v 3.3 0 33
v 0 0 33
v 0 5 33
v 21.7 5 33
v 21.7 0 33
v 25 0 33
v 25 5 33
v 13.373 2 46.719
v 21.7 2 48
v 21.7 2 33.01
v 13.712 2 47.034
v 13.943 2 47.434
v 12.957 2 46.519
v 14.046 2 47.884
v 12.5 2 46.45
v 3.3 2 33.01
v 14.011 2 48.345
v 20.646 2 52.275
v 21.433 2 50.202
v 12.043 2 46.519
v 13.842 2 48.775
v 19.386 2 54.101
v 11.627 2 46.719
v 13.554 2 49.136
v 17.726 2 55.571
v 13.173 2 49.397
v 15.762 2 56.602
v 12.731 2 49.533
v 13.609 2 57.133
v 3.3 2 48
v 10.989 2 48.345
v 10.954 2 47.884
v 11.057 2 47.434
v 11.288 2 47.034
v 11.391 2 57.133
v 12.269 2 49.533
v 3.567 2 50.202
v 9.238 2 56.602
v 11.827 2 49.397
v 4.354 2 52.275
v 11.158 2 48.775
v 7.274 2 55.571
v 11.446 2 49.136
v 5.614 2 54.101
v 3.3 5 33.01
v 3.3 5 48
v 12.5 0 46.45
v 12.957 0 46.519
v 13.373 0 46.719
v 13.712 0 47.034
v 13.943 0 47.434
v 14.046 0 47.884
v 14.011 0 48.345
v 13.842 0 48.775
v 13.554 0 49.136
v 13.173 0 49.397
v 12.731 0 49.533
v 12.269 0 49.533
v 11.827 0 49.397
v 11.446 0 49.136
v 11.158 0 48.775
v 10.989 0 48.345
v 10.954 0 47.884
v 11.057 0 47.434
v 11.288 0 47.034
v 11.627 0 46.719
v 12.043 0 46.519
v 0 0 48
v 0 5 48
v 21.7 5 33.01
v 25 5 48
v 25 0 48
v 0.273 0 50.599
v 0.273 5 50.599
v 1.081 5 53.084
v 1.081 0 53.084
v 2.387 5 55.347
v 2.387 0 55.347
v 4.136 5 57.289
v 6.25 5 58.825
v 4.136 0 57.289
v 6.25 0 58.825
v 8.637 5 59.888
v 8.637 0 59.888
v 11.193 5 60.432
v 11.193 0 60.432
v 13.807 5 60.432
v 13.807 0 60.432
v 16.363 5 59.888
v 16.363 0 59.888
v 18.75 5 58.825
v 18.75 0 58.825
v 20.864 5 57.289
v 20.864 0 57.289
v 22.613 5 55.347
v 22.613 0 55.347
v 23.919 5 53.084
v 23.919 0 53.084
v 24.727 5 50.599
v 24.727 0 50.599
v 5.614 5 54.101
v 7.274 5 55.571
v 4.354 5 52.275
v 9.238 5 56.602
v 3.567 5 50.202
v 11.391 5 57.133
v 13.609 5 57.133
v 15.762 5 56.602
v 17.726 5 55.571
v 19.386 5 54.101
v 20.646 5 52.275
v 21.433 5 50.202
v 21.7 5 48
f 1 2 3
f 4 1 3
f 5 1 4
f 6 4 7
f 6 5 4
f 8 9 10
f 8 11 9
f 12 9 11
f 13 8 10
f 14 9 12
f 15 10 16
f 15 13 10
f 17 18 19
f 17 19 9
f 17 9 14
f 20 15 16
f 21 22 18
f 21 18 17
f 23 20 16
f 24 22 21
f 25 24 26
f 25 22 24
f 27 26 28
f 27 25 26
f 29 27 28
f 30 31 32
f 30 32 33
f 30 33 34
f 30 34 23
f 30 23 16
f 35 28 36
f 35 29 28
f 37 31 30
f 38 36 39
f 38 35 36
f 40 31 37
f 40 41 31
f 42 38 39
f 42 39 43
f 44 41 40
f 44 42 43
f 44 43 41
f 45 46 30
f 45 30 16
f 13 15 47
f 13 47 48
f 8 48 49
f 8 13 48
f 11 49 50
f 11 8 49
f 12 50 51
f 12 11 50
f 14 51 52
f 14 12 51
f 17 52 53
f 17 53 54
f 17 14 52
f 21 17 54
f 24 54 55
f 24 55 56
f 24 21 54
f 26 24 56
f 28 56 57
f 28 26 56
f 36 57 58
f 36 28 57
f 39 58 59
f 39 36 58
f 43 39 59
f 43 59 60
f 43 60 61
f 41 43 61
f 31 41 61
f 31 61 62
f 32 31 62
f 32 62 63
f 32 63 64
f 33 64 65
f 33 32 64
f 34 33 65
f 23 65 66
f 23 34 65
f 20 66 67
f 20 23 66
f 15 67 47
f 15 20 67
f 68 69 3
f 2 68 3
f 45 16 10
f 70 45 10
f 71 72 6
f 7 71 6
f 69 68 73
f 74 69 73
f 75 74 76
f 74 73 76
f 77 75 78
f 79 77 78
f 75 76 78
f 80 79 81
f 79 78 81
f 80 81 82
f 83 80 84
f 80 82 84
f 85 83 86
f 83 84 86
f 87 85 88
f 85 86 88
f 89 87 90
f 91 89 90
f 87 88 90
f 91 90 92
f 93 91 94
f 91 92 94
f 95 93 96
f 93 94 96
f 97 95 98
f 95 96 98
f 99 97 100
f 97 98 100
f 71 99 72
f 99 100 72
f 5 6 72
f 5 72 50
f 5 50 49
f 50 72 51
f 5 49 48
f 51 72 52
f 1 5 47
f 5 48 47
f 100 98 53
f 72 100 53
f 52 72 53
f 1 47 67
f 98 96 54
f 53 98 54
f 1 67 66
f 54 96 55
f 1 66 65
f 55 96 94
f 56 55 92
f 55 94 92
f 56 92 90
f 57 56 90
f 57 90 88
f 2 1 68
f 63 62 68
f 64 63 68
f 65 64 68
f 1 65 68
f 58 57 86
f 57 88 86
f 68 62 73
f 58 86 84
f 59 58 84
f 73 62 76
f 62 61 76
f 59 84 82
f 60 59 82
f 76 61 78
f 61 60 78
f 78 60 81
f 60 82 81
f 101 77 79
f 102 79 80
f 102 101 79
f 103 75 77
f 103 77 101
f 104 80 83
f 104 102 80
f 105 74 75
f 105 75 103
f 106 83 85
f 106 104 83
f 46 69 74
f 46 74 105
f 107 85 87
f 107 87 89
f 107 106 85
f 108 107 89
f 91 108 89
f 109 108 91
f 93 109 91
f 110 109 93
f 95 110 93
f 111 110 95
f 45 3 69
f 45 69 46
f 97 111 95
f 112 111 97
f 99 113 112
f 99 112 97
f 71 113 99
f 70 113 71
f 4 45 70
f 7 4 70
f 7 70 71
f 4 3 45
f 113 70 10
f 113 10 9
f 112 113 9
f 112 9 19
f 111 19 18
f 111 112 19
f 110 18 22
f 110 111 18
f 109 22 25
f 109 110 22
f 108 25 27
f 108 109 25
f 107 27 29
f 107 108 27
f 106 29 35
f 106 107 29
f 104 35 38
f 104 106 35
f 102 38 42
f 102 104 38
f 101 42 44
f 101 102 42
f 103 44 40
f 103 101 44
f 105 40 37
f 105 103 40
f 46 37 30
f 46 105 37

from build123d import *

# Parameters (mm, degrees)
SKETCH_1_R           = 2.55
SKETCH_1_R_2         = 7.5
EXTRUDE_1_DEPTH      = 5
FILLET_2_R           = 5
CUT_EXTRUDE_1_DEPTH  = 109.559891304
EXTRUDE_2_DEPTH      = 5
SKETCH_3_R           = 1.55
CUT_EXTRUDE_2_DEPTH  = 109.559891304
FILLET_3_R           = 2
SKETCH_5_R           = 3
CUT_EXTRUDE_3_DEPTH  = 3
SKETCH_6_OUTSIDE_W   = 117.274
SKETCH_6_OUTSIDE_H   = 115.837
SKETCH_6_OUTSIDE_W_2 = 25
SKETCH_6_OUTSIDE_H_2 = 29.920384019
CUT_EXTRUDE_4_DEPTH  = 109.559891304
EXTRUDE_START        = -2
SKETCH_7_R           = 1.55
EXTRUDE_3_DEPTH      = 2
SKETCH_8_W           = 18.4
SKETCH_8_H           = 0.01
EXTRUDE_4_DEPTH      = 3


with BuildPart() as part:
    # ｽｹｯﾁ1 → ﾎﾞｽ - 押し出し1 (new body)
    with BuildSketch(Plane(origin=(0, 0, 0), x_dir=(1, 0, 0), z_dir=(0, 1, 0))):
        with BuildLine():
            Line((0, 0), (0, -48))
            ThreePointArc((0, -48), (12.5, -60.5), (25, -48))
            Line((25, -48), (25, -20))
            Line((25, -20), (90, -20))
            Line((90, -20), (90, 30))
            Line((90, 30), (0, 0))
        make_face()
        with Locations(Location((75.769750529, 14.715657976, 0), (0, 0, 270))):
            Circle(SKETCH_1_R, mode=Mode.SUBTRACT)
        with Locations(Location((75, -10, 0), (0, 0, 270))):
            Circle(SKETCH_1_R, mode=Mode.SUBTRACT)
        with Locations(Location((25, -10, 0), (0, 0, 270))):
            Circle(SKETCH_1_R, mode=Mode.SUBTRACT)
        with Locations(Location((12.5, -48, 0), (0, 0, 270))):
            Circle(SKETCH_1_R_2, mode=Mode.SUBTRACT)
    extrude(amount=EXTRUDE_1_DEPTH)

    # ﾌｨﾚｯﾄ2
    fillet_2_edges = [part.edges().sort_by_distance(p)[0] for p in [
        (90, 2.5, -30),
        (90, 2.5, 20),
    ]]
    fillet(fillet_2_edges, radius=FILLET_2_R)

    # ｽｹｯﾁ2 → ｶｯﾄ - 押し出し1 (cut, through all)
    with BuildSketch(Plane(origin=(0, 5, 0), x_dir=(1, 0, 0), z_dir=(0, 1, 0))):
        with BuildLine():
            Line((3.3, -48), (3.3, -33))
            Line((3.3, -33), (21.7, -33))
            Line((21.7, -33), (21.7, -48))
            ThreePointArc((21.7, -48), (12.5, -57.2), (3.3, -48))
        make_face()
    extrude(amount=-CUT_EXTRUDE_1_DEPTH, mode=Mode.SUBTRACT)

    # ｽｹｯﾁ4 → ﾎﾞｽ - 押し出し2 (add)
    with BuildSketch(Plane(origin=(0, 5, 0), x_dir=(1, 0, 0), z_dir=(0, 1, 0))):
        Polygon((0, 0), (0, 20), (60, 20), align=None)
    extrude(amount=-EXTRUDE_2_DEPTH)

    # ｽｹｯﾁ3 → ｶｯﾄ - 押し出し2 (cut, through all)
    with BuildSketch(Plane(origin=(0, 5, 0), x_dir=(1, 0, 0), z_dir=(0, 1, 0))):
        with Locations(Location((20.5, 5, 0), (0, 0, 270))):
            Circle(SKETCH_3_R)
        with Locations(Location((4.5, 5, 0), (0, 0, 90))):
            Circle(SKETCH_3_R)
    extrude(amount=-CUT_EXTRUDE_2_DEPTH, mode=Mode.SUBTRACT)

    # ﾌｨﾚｯﾄ3
    fillet_3_edges = [part.edges().sort_by_distance(p)[0] for p in [
        (60, 2.5, -20),
        (0, 2.5, -20),
    ]]
    fillet(fillet_3_edges, radius=FILLET_3_R)

    # ｽｹｯﾁ5 → ｶｯﾄ - 押し出し3 (cut)
    with BuildSketch(Plane.XZ.offset(-5)):
        with Locations(Location((4.5, -5, 0), (0, 0, 270))):
            Circle(SKETCH_5_R)
        with Locations(Location((20.5, -5, 0), (0, 0, 270))):
            Circle(SKETCH_5_R)
    extrude(amount=CUT_EXTRUDE_3_DEPTH, mode=Mode.SUBTRACT)

    # ｽｹｯﾁ6 outside → ｶｯﾄ - 押し出し4 (cut, through all)
    with BuildSketch(Plane(origin=(0, 5, 0), x_dir=(1, 0, 0), z_dir=(0, 1, 0))):
        with Locations((45, -16.2185)):
            Rectangle(SKETCH_6_OUTSIDE_W, SKETCH_6_OUTSIDE_H)
        with Locations((12.5, -47.96019201)):
            Rectangle(SKETCH_6_OUTSIDE_W_2, SKETCH_6_OUTSIDE_H_2, mode=Mode.SUBTRACT)
    extrude(amount=-CUT_EXTRUDE_4_DEPTH, mode=Mode.SUBTRACT)

    # ｽｹｯﾁ7 → ﾎﾞｽ - 押し出し3 (add)
    with BuildSketch(Plane.XZ.offset(EXTRUDE_START)):
        with BuildLine():
            Line((3.3, 33), (3.3, 48))
            ThreePointArc((3.3, 48), (12.5, 57.2), (21.7, 48))
            Line((21.7, 48), (21.7, 33))
            Line((21.7, 33), (3.3, 33))
        make_face()
        with Locations(Location((12.5, 48, 0), (0, 0, 270))):
            Circle(SKETCH_7_R, mode=Mode.SUBTRACT)
    extrude(amount=EXTRUDE_3_DEPTH)

    # ｽｹｯﾁ8 → ﾎﾞｽ - 押し出し4 (add)
    with BuildSketch(Plane(origin=(0, 2, 0), x_dir=(1, 0, 0), z_dir=(0, 1, 0))):
        with Locations((12.5, -33.005)):
            Rectangle(SKETCH_8_W, SKETCH_8_H)
    extrude(amount=EXTRUDE_4_DEPTH)


solid = part.part
